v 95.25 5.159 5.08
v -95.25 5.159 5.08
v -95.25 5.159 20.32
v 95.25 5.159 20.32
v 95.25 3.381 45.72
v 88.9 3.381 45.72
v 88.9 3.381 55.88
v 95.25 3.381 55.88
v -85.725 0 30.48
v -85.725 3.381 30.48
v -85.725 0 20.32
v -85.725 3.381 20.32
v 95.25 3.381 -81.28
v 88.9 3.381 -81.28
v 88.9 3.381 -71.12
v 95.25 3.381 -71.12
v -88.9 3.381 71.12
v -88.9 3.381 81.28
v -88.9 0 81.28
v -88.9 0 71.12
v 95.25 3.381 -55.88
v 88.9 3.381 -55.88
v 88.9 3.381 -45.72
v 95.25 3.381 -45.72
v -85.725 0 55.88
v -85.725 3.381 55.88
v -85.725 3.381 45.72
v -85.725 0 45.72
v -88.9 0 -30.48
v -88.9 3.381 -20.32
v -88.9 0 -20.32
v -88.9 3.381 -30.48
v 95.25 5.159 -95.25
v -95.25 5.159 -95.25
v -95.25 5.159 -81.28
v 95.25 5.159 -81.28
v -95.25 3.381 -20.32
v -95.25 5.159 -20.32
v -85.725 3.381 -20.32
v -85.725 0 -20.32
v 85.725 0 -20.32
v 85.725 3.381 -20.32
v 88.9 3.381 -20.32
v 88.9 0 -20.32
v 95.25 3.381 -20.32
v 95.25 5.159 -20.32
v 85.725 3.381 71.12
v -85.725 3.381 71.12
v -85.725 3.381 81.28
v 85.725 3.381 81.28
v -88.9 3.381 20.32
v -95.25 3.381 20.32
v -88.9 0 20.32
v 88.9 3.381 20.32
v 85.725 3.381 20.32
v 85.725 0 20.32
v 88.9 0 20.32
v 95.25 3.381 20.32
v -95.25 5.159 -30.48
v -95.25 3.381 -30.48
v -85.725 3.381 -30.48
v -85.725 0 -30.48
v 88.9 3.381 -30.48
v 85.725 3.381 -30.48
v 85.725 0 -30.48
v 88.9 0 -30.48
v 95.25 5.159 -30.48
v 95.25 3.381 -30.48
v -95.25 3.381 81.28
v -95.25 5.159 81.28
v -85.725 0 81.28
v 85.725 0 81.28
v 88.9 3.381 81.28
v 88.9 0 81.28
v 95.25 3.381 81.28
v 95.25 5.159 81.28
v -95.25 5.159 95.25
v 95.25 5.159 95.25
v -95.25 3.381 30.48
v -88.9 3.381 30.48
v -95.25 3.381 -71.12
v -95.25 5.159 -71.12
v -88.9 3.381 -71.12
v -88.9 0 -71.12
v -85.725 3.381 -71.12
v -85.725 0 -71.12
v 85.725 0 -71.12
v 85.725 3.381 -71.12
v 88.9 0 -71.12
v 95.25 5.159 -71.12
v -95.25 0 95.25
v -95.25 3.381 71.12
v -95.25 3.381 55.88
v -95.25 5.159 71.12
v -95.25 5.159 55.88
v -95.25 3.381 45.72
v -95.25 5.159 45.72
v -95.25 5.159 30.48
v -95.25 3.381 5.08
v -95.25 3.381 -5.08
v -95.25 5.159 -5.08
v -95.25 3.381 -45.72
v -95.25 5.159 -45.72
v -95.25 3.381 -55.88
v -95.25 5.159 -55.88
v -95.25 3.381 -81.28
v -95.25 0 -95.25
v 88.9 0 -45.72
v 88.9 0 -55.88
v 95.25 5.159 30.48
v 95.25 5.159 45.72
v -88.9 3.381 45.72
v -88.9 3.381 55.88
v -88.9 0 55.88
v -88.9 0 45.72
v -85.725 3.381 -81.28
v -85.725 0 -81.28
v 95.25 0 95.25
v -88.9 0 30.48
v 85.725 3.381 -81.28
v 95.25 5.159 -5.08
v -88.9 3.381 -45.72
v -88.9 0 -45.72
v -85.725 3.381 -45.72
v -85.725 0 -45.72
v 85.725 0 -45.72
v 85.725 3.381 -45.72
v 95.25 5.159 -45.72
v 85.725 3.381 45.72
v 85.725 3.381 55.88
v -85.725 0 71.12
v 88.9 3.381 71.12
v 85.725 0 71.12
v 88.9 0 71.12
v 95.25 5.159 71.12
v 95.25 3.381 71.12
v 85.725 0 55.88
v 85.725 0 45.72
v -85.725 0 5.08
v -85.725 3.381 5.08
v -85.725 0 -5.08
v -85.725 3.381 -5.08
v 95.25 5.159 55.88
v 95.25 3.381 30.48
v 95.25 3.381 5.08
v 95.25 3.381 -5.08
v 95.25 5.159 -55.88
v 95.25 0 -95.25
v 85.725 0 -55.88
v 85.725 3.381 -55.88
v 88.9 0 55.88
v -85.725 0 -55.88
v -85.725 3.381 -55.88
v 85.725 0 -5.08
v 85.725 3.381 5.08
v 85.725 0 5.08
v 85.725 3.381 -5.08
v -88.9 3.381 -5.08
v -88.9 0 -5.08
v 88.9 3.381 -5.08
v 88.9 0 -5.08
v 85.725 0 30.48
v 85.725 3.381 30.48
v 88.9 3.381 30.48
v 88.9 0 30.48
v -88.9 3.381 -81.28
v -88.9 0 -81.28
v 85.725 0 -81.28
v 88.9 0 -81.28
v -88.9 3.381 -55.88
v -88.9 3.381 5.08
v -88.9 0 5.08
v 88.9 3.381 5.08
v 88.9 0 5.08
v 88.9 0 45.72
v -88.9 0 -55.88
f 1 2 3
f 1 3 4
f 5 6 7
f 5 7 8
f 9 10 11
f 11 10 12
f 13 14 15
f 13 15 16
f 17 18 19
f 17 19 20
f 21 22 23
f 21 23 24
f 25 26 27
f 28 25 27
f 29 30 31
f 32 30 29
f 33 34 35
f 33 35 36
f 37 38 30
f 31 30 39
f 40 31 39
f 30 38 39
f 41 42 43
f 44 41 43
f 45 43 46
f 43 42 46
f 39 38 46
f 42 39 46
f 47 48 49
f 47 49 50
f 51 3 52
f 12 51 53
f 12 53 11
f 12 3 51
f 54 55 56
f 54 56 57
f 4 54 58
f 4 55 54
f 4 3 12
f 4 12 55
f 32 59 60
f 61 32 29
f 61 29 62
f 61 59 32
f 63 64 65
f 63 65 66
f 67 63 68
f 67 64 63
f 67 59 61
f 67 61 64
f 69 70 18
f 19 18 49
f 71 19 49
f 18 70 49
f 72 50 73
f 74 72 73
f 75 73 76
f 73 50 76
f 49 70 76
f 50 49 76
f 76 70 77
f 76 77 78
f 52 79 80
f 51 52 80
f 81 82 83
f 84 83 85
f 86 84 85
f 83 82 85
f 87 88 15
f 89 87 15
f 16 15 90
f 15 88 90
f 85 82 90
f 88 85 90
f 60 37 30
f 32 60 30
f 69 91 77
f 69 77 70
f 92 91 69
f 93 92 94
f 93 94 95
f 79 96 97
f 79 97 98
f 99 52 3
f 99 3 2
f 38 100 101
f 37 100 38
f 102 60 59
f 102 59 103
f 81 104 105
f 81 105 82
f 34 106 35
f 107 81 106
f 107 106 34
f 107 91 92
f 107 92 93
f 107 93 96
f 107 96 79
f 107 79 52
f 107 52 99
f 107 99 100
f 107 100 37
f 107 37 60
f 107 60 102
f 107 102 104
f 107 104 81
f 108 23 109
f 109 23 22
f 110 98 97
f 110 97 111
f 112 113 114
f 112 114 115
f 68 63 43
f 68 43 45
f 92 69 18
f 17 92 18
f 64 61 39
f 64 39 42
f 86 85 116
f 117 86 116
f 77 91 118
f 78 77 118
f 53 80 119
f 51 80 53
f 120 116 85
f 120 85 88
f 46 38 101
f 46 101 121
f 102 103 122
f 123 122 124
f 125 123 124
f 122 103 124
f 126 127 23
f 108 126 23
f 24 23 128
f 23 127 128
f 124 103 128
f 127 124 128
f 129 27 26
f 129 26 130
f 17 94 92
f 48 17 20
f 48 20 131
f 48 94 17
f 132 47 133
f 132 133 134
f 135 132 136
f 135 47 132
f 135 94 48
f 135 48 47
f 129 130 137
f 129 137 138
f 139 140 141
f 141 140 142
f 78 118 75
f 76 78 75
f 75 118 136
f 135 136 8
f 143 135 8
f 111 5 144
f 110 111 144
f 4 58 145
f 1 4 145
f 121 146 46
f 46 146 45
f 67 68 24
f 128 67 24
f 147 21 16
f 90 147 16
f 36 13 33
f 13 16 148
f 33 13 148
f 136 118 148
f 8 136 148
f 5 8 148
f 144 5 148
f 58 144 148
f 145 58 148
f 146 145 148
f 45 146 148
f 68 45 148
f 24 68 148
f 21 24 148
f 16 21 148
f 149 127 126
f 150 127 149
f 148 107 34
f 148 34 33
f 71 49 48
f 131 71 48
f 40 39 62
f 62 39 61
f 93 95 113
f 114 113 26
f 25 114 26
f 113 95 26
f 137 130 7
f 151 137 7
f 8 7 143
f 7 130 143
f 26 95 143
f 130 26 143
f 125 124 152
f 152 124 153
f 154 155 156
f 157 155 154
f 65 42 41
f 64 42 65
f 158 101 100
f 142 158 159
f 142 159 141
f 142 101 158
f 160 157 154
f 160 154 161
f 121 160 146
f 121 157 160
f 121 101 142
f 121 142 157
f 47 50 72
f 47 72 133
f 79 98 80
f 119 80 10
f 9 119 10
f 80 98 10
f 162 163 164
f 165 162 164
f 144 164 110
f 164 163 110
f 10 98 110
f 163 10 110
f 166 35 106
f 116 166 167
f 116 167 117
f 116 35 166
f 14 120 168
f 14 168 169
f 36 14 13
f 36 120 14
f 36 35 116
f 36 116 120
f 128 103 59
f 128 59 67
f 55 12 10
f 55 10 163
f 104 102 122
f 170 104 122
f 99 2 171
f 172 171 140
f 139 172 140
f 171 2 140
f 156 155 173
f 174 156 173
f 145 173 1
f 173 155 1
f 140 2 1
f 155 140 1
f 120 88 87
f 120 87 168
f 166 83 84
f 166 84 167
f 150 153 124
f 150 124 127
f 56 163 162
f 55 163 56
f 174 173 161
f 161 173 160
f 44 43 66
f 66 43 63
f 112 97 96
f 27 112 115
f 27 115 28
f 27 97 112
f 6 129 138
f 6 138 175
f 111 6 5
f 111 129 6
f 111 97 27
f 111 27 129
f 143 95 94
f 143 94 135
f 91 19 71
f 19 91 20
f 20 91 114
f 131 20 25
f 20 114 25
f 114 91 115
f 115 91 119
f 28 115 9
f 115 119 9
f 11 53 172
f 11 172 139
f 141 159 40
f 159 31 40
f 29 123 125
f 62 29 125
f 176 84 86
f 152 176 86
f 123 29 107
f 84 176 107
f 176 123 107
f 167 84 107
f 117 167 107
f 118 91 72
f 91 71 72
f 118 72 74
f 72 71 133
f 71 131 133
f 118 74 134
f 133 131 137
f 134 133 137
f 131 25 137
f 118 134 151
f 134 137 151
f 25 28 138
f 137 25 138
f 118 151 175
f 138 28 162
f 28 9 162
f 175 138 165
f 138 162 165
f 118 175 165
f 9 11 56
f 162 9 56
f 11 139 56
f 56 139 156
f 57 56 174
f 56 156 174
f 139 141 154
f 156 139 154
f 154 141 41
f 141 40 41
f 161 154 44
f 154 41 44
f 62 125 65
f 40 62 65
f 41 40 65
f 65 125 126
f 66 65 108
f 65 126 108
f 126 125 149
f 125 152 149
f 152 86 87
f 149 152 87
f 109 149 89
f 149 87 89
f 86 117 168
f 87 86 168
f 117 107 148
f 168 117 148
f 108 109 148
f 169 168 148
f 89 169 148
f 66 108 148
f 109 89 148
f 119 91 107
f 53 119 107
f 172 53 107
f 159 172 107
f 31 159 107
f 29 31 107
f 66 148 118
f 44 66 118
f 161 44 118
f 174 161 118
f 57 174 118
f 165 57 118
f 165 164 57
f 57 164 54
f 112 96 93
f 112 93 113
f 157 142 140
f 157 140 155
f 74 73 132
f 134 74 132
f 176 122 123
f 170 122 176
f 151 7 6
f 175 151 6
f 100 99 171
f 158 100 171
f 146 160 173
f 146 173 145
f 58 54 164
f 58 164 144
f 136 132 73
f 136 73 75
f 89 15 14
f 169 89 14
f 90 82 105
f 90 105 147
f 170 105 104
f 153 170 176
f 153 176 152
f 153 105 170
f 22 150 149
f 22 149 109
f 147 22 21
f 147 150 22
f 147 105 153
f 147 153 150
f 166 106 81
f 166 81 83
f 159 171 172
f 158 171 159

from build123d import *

# Parameters (mm, degrees)
SKETCH1_W           = 190.5
SKETCH1_H           = 190.5
BOSS_EXTRUDE1_DEPTH = 5.159375
SKETCH2_W           = 190.5
SKETCH2_H           = 10.16
CUT_EXTRUDE1_DEPTH  = 1.778
SKETCH3_W           = 3.175
SKETCH3_H           = 10.16
CUT_EXTRUDE3_DEPTH  = 4.381375
LPATTERN1_COUNT     = 7
LPATTERN1_PITCH     = 25.4


with BuildPart() as part:
    # Sketch1 → Boss-Extrude1 (new body)
    with BuildSketch(Plane(origin=(0, 0, 0), x_dir=(1, 0, 0), z_dir=(0, 1, 0))):
        Rectangle(SKETCH1_W, SKETCH1_H)
    extrude(amount=BOSS_EXTRUDE1_DEPTH)

    # Sketch2 → Cut-Extrude1 (cut)
    with BuildSketch(Plane(origin=(0, 5.159375, 0), x_dir=(1, 0, 0), z_dir=(0, 1, 0))):
        with Locations((0, 76.2)):
            Rectangle(SKETCH2_W, SKETCH2_H)
        with Locations((0, 50.8)):
            Rectangle(SKETCH2_W, SKETCH2_H)
        with Locations((0, 25.4)):
            Rectangle(SKETCH2_W, SKETCH2_H)
        Rectangle(SKETCH2_W, SKETCH2_H)
        with Locations((0, -25.4)):
            Rectangle(SKETCH2_W, SKETCH2_H)
        with Locations((0, -50.8)):
            Rectangle(SKETCH2_W, SKETCH2_H)
        with Locations((0, -76.2)):
            Rectangle(SKETCH2_W, SKETCH2_H)
    extrude(amount=-CUT_EXTRUDE1_DEPTH, mode=Mode.SUBTRACT)

    # Sketch3 → Cut-Extrude3 (cut, through all)
    with BuildSketch(Plane(origin=(0, 3.381375, 0), x_dir=(1, 0, 0), z_dir=(0, 1, 0))):
        with Locations((-87.3125, 76.2)):
            Rectangle(SKETCH3_W, SKETCH3_H)
        with Locations((87.3125, 76.2)):
            Rectangle(SKETCH3_W, SKETCH3_H)
    cut_extrude3 = extrude(amount=-CUT_EXTRUDE3_DEPTH, mode=Mode.SUBTRACT)

    # LPattern1: Cut-Extrude3 ×7
    with Locations(*[(0, 0, i * LPATTERN1_PITCH) for i in range(1, LPATTERN1_COUNT)]):
        add(cut_extrude3, mode=Mode.SUBTRACT)


solid = part.part
